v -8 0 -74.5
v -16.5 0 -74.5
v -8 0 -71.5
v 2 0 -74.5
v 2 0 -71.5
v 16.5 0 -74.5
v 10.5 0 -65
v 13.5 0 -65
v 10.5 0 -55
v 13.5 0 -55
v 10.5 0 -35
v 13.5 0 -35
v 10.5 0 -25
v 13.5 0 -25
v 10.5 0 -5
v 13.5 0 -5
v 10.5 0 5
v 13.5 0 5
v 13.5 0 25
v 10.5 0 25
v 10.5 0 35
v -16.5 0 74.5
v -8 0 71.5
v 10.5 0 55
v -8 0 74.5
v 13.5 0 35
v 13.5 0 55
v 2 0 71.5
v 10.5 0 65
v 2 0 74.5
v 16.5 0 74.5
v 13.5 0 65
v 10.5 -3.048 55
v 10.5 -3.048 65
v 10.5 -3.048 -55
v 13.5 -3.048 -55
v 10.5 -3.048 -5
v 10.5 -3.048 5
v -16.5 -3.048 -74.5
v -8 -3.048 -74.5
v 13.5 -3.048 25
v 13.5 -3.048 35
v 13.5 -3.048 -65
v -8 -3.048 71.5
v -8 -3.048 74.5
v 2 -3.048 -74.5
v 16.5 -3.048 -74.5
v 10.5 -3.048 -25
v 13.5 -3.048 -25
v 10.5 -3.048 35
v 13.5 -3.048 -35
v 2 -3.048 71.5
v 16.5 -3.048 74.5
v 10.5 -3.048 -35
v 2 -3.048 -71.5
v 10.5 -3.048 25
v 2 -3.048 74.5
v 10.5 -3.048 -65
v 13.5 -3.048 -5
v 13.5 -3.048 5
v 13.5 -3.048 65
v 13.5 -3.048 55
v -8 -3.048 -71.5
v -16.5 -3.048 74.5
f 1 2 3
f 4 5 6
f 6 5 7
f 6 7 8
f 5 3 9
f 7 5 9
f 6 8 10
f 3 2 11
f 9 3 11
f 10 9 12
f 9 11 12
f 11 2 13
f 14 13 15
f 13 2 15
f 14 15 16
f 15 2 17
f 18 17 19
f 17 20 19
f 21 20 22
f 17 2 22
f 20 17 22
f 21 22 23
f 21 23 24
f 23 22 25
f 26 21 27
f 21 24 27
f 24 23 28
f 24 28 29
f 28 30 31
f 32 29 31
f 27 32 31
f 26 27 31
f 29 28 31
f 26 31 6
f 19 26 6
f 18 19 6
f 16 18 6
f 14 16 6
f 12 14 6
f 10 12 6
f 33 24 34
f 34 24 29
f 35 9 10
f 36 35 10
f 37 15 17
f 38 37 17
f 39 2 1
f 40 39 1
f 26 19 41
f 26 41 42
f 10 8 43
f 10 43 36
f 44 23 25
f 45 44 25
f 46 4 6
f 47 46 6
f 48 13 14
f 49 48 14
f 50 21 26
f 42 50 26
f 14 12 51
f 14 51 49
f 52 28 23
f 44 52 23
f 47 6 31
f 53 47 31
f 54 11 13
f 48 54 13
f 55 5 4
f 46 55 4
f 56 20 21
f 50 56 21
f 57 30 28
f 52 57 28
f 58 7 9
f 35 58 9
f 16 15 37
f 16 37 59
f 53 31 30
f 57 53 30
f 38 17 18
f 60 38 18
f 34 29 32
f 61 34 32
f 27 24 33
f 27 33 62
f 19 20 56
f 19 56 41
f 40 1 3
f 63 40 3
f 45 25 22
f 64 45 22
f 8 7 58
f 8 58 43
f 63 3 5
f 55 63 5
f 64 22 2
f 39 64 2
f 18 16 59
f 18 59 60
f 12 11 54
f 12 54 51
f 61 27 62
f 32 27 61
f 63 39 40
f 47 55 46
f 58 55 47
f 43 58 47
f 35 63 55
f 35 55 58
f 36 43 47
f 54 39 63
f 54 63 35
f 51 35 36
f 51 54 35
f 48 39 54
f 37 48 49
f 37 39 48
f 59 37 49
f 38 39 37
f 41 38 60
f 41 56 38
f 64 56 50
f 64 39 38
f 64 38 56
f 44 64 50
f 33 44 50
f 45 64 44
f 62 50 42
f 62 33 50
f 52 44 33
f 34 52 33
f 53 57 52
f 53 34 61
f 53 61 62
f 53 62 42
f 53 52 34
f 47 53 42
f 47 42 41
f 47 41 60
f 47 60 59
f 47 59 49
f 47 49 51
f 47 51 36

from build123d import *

# Parameters (mm, degrees)
F0_W     = 2.999994
F0_H     = 10.000005
F0_H_2   = 9.99998
F1_DEPTH = 3.048


with BuildPart() as f1:
    # F0 (on Front) → F1 (new body)
    with BuildSketch(Plane.XZ):
        Polygon((16.499992, 74.500003), (1.999996, 74.500003), (1.999996, 71.500009), (-8.000009, 71.500009), (-8.000009, 74.500003), (-16.499992, 74.500003), (-16.499992, -74.499978), (-8.000009, -74.499978), (-8.000009, -71.499984), (1.999996, -71.499984), (1.999996, -74.499978), (16.499992, -74.499978), align=None)
        with Locations((12.000001, -59.999994)):
            Rectangle(F0_W, F0_H, mode=Mode.SUBTRACT)
        with Locations((12.000001, -29.999991)):
            Rectangle(F0_W, F0_H_2, mode=Mode.SUBTRACT)
        with Locations((12.000001, 1.2e-05)):
            Rectangle(F0_W, F0_H, mode=Mode.SUBTRACT)
        with Locations((12.000001, 30.000003)):
            Rectangle(F0_W, F0_H, mode=Mode.SUBTRACT)
        with Locations((12.000001, 60.000007)):
            Rectangle(F0_W, F0_H_2, mode=Mode.SUBTRACT)
    extrude(amount=F1_DEPTH)


solid = f1.part
